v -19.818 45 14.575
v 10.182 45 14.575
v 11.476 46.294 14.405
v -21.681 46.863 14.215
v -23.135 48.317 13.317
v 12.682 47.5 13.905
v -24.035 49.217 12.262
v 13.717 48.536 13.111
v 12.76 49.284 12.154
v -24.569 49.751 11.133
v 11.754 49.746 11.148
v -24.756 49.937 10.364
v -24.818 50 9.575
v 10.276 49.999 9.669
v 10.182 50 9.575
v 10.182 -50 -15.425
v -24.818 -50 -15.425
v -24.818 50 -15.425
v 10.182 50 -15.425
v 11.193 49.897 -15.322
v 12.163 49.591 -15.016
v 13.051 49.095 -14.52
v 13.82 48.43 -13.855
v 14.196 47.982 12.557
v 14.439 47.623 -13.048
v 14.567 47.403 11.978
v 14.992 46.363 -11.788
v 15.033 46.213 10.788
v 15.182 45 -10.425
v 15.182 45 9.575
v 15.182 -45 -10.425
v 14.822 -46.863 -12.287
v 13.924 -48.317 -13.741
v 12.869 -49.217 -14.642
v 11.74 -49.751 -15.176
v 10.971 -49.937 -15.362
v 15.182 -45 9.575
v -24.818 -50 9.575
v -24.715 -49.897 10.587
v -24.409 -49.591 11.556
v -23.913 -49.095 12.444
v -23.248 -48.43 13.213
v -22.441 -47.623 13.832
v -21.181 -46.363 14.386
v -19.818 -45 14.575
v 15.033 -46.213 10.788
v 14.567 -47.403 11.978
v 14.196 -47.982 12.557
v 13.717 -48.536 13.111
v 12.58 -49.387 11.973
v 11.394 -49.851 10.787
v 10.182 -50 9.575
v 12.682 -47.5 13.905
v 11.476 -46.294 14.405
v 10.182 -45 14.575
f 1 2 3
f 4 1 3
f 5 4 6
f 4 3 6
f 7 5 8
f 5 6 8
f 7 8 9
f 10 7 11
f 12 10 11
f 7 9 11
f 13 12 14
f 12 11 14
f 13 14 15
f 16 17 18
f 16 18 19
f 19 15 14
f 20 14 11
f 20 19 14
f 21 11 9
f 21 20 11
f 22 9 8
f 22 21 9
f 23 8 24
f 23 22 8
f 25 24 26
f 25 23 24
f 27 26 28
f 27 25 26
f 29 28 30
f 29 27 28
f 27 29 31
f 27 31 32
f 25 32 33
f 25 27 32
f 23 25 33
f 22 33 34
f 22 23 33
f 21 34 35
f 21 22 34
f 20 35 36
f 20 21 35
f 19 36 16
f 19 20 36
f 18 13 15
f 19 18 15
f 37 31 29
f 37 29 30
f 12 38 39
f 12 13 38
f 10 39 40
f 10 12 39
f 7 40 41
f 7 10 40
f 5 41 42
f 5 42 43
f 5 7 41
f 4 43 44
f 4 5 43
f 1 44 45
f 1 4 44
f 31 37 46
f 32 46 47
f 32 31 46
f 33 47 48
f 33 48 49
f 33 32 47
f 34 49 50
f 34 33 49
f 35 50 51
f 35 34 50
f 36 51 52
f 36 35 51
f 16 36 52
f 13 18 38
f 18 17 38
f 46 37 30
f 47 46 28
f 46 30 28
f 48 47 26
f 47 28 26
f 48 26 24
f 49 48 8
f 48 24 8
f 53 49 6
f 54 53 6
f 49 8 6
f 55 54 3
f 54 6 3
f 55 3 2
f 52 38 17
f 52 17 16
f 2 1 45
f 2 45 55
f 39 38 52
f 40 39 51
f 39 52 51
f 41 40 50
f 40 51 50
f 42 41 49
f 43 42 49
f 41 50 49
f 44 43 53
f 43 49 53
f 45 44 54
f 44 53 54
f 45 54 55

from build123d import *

# Parameters (mm, degrees)
F0_W        = 40
F0_H        = 30
F1_DEPTH    = 50
F2_R        = 5
F3_T1_DEPTH = 50
F3_T3_DEPTH = 125


# Not quite as in the source:
# - a fillet or chamfer that OpenCascade refuses, or shapes differently, is made with other operations: its cross-section is extruded or revolved along the edge and cut away or added


with BuildPart() as f1:
    # F0 (on Front) → F1 (new body, symmetric)
    with BuildSketch(Plane.XZ):
        with Locations((-4.8181314529, -0.4249101039)):
            Rectangle(F0_W, F0_H)
    extrude(amount=F1_DEPTH, both=True)

    # F2
    f2_edges = [f1.edges().sort_by_distance(p)[0] for p in [
        (-4.818131, 50, 14.57509),
        (-24.818131, 0, 14.57509),
        (-4.818131, -50, 14.57509),
        (15.181869, 0, 14.57509),
    ]]
    fillet(f2_edges, radius=F2_R)

    # F3: fillet of radius 5 on 4 edges, made by hand

    # F3_s2 → F3_t1 (cut)
    with BuildSketch(Plane.XY.offset(-27.9249101039)):
        with BuildLine():
            ThreePointArc((10.1818685471, 50), (13.717402453, 48.5355339059), (15.1818685471, 45))
            Line((15.1818685471, 45), (15.1818685471, 50))
            Line((15.1818685471, 50), (10.1818685471, 50))
        make_face()
        with BuildLine():
            ThreePointArc((15.1818685471, -45), (13.717402453, -48.5355339059), (10.1818685471, -50))
            Line((10.1818685471, -50), (15.1818685471, -50))
            Line((15.1818685471, -50), (15.1818685471, -45))
        make_face()
    extrude(amount=F3_T1_DEPTH, mode=Mode.SUBTRACT)

    # F3_s4 → F3_t3 (cut)
    with BuildSketch(Plane.XZ.offset(-62.5)):
        with BuildLine():
            ThreePointArc((15.1818685471, -10.4249101039), (13.717402453, -13.9604440098), (10.1818685471, -15.4249101039))
            Line((10.1818685471, -15.4249101039), (15.1818685471, -15.4249101039))
            Line((15.1818685471, -15.4249101039), (15.1818685471, -10.4249101039))
        make_face()
    extrude(amount=F3_T3_DEPTH, mode=Mode.SUBTRACT)


solid = f1.part
